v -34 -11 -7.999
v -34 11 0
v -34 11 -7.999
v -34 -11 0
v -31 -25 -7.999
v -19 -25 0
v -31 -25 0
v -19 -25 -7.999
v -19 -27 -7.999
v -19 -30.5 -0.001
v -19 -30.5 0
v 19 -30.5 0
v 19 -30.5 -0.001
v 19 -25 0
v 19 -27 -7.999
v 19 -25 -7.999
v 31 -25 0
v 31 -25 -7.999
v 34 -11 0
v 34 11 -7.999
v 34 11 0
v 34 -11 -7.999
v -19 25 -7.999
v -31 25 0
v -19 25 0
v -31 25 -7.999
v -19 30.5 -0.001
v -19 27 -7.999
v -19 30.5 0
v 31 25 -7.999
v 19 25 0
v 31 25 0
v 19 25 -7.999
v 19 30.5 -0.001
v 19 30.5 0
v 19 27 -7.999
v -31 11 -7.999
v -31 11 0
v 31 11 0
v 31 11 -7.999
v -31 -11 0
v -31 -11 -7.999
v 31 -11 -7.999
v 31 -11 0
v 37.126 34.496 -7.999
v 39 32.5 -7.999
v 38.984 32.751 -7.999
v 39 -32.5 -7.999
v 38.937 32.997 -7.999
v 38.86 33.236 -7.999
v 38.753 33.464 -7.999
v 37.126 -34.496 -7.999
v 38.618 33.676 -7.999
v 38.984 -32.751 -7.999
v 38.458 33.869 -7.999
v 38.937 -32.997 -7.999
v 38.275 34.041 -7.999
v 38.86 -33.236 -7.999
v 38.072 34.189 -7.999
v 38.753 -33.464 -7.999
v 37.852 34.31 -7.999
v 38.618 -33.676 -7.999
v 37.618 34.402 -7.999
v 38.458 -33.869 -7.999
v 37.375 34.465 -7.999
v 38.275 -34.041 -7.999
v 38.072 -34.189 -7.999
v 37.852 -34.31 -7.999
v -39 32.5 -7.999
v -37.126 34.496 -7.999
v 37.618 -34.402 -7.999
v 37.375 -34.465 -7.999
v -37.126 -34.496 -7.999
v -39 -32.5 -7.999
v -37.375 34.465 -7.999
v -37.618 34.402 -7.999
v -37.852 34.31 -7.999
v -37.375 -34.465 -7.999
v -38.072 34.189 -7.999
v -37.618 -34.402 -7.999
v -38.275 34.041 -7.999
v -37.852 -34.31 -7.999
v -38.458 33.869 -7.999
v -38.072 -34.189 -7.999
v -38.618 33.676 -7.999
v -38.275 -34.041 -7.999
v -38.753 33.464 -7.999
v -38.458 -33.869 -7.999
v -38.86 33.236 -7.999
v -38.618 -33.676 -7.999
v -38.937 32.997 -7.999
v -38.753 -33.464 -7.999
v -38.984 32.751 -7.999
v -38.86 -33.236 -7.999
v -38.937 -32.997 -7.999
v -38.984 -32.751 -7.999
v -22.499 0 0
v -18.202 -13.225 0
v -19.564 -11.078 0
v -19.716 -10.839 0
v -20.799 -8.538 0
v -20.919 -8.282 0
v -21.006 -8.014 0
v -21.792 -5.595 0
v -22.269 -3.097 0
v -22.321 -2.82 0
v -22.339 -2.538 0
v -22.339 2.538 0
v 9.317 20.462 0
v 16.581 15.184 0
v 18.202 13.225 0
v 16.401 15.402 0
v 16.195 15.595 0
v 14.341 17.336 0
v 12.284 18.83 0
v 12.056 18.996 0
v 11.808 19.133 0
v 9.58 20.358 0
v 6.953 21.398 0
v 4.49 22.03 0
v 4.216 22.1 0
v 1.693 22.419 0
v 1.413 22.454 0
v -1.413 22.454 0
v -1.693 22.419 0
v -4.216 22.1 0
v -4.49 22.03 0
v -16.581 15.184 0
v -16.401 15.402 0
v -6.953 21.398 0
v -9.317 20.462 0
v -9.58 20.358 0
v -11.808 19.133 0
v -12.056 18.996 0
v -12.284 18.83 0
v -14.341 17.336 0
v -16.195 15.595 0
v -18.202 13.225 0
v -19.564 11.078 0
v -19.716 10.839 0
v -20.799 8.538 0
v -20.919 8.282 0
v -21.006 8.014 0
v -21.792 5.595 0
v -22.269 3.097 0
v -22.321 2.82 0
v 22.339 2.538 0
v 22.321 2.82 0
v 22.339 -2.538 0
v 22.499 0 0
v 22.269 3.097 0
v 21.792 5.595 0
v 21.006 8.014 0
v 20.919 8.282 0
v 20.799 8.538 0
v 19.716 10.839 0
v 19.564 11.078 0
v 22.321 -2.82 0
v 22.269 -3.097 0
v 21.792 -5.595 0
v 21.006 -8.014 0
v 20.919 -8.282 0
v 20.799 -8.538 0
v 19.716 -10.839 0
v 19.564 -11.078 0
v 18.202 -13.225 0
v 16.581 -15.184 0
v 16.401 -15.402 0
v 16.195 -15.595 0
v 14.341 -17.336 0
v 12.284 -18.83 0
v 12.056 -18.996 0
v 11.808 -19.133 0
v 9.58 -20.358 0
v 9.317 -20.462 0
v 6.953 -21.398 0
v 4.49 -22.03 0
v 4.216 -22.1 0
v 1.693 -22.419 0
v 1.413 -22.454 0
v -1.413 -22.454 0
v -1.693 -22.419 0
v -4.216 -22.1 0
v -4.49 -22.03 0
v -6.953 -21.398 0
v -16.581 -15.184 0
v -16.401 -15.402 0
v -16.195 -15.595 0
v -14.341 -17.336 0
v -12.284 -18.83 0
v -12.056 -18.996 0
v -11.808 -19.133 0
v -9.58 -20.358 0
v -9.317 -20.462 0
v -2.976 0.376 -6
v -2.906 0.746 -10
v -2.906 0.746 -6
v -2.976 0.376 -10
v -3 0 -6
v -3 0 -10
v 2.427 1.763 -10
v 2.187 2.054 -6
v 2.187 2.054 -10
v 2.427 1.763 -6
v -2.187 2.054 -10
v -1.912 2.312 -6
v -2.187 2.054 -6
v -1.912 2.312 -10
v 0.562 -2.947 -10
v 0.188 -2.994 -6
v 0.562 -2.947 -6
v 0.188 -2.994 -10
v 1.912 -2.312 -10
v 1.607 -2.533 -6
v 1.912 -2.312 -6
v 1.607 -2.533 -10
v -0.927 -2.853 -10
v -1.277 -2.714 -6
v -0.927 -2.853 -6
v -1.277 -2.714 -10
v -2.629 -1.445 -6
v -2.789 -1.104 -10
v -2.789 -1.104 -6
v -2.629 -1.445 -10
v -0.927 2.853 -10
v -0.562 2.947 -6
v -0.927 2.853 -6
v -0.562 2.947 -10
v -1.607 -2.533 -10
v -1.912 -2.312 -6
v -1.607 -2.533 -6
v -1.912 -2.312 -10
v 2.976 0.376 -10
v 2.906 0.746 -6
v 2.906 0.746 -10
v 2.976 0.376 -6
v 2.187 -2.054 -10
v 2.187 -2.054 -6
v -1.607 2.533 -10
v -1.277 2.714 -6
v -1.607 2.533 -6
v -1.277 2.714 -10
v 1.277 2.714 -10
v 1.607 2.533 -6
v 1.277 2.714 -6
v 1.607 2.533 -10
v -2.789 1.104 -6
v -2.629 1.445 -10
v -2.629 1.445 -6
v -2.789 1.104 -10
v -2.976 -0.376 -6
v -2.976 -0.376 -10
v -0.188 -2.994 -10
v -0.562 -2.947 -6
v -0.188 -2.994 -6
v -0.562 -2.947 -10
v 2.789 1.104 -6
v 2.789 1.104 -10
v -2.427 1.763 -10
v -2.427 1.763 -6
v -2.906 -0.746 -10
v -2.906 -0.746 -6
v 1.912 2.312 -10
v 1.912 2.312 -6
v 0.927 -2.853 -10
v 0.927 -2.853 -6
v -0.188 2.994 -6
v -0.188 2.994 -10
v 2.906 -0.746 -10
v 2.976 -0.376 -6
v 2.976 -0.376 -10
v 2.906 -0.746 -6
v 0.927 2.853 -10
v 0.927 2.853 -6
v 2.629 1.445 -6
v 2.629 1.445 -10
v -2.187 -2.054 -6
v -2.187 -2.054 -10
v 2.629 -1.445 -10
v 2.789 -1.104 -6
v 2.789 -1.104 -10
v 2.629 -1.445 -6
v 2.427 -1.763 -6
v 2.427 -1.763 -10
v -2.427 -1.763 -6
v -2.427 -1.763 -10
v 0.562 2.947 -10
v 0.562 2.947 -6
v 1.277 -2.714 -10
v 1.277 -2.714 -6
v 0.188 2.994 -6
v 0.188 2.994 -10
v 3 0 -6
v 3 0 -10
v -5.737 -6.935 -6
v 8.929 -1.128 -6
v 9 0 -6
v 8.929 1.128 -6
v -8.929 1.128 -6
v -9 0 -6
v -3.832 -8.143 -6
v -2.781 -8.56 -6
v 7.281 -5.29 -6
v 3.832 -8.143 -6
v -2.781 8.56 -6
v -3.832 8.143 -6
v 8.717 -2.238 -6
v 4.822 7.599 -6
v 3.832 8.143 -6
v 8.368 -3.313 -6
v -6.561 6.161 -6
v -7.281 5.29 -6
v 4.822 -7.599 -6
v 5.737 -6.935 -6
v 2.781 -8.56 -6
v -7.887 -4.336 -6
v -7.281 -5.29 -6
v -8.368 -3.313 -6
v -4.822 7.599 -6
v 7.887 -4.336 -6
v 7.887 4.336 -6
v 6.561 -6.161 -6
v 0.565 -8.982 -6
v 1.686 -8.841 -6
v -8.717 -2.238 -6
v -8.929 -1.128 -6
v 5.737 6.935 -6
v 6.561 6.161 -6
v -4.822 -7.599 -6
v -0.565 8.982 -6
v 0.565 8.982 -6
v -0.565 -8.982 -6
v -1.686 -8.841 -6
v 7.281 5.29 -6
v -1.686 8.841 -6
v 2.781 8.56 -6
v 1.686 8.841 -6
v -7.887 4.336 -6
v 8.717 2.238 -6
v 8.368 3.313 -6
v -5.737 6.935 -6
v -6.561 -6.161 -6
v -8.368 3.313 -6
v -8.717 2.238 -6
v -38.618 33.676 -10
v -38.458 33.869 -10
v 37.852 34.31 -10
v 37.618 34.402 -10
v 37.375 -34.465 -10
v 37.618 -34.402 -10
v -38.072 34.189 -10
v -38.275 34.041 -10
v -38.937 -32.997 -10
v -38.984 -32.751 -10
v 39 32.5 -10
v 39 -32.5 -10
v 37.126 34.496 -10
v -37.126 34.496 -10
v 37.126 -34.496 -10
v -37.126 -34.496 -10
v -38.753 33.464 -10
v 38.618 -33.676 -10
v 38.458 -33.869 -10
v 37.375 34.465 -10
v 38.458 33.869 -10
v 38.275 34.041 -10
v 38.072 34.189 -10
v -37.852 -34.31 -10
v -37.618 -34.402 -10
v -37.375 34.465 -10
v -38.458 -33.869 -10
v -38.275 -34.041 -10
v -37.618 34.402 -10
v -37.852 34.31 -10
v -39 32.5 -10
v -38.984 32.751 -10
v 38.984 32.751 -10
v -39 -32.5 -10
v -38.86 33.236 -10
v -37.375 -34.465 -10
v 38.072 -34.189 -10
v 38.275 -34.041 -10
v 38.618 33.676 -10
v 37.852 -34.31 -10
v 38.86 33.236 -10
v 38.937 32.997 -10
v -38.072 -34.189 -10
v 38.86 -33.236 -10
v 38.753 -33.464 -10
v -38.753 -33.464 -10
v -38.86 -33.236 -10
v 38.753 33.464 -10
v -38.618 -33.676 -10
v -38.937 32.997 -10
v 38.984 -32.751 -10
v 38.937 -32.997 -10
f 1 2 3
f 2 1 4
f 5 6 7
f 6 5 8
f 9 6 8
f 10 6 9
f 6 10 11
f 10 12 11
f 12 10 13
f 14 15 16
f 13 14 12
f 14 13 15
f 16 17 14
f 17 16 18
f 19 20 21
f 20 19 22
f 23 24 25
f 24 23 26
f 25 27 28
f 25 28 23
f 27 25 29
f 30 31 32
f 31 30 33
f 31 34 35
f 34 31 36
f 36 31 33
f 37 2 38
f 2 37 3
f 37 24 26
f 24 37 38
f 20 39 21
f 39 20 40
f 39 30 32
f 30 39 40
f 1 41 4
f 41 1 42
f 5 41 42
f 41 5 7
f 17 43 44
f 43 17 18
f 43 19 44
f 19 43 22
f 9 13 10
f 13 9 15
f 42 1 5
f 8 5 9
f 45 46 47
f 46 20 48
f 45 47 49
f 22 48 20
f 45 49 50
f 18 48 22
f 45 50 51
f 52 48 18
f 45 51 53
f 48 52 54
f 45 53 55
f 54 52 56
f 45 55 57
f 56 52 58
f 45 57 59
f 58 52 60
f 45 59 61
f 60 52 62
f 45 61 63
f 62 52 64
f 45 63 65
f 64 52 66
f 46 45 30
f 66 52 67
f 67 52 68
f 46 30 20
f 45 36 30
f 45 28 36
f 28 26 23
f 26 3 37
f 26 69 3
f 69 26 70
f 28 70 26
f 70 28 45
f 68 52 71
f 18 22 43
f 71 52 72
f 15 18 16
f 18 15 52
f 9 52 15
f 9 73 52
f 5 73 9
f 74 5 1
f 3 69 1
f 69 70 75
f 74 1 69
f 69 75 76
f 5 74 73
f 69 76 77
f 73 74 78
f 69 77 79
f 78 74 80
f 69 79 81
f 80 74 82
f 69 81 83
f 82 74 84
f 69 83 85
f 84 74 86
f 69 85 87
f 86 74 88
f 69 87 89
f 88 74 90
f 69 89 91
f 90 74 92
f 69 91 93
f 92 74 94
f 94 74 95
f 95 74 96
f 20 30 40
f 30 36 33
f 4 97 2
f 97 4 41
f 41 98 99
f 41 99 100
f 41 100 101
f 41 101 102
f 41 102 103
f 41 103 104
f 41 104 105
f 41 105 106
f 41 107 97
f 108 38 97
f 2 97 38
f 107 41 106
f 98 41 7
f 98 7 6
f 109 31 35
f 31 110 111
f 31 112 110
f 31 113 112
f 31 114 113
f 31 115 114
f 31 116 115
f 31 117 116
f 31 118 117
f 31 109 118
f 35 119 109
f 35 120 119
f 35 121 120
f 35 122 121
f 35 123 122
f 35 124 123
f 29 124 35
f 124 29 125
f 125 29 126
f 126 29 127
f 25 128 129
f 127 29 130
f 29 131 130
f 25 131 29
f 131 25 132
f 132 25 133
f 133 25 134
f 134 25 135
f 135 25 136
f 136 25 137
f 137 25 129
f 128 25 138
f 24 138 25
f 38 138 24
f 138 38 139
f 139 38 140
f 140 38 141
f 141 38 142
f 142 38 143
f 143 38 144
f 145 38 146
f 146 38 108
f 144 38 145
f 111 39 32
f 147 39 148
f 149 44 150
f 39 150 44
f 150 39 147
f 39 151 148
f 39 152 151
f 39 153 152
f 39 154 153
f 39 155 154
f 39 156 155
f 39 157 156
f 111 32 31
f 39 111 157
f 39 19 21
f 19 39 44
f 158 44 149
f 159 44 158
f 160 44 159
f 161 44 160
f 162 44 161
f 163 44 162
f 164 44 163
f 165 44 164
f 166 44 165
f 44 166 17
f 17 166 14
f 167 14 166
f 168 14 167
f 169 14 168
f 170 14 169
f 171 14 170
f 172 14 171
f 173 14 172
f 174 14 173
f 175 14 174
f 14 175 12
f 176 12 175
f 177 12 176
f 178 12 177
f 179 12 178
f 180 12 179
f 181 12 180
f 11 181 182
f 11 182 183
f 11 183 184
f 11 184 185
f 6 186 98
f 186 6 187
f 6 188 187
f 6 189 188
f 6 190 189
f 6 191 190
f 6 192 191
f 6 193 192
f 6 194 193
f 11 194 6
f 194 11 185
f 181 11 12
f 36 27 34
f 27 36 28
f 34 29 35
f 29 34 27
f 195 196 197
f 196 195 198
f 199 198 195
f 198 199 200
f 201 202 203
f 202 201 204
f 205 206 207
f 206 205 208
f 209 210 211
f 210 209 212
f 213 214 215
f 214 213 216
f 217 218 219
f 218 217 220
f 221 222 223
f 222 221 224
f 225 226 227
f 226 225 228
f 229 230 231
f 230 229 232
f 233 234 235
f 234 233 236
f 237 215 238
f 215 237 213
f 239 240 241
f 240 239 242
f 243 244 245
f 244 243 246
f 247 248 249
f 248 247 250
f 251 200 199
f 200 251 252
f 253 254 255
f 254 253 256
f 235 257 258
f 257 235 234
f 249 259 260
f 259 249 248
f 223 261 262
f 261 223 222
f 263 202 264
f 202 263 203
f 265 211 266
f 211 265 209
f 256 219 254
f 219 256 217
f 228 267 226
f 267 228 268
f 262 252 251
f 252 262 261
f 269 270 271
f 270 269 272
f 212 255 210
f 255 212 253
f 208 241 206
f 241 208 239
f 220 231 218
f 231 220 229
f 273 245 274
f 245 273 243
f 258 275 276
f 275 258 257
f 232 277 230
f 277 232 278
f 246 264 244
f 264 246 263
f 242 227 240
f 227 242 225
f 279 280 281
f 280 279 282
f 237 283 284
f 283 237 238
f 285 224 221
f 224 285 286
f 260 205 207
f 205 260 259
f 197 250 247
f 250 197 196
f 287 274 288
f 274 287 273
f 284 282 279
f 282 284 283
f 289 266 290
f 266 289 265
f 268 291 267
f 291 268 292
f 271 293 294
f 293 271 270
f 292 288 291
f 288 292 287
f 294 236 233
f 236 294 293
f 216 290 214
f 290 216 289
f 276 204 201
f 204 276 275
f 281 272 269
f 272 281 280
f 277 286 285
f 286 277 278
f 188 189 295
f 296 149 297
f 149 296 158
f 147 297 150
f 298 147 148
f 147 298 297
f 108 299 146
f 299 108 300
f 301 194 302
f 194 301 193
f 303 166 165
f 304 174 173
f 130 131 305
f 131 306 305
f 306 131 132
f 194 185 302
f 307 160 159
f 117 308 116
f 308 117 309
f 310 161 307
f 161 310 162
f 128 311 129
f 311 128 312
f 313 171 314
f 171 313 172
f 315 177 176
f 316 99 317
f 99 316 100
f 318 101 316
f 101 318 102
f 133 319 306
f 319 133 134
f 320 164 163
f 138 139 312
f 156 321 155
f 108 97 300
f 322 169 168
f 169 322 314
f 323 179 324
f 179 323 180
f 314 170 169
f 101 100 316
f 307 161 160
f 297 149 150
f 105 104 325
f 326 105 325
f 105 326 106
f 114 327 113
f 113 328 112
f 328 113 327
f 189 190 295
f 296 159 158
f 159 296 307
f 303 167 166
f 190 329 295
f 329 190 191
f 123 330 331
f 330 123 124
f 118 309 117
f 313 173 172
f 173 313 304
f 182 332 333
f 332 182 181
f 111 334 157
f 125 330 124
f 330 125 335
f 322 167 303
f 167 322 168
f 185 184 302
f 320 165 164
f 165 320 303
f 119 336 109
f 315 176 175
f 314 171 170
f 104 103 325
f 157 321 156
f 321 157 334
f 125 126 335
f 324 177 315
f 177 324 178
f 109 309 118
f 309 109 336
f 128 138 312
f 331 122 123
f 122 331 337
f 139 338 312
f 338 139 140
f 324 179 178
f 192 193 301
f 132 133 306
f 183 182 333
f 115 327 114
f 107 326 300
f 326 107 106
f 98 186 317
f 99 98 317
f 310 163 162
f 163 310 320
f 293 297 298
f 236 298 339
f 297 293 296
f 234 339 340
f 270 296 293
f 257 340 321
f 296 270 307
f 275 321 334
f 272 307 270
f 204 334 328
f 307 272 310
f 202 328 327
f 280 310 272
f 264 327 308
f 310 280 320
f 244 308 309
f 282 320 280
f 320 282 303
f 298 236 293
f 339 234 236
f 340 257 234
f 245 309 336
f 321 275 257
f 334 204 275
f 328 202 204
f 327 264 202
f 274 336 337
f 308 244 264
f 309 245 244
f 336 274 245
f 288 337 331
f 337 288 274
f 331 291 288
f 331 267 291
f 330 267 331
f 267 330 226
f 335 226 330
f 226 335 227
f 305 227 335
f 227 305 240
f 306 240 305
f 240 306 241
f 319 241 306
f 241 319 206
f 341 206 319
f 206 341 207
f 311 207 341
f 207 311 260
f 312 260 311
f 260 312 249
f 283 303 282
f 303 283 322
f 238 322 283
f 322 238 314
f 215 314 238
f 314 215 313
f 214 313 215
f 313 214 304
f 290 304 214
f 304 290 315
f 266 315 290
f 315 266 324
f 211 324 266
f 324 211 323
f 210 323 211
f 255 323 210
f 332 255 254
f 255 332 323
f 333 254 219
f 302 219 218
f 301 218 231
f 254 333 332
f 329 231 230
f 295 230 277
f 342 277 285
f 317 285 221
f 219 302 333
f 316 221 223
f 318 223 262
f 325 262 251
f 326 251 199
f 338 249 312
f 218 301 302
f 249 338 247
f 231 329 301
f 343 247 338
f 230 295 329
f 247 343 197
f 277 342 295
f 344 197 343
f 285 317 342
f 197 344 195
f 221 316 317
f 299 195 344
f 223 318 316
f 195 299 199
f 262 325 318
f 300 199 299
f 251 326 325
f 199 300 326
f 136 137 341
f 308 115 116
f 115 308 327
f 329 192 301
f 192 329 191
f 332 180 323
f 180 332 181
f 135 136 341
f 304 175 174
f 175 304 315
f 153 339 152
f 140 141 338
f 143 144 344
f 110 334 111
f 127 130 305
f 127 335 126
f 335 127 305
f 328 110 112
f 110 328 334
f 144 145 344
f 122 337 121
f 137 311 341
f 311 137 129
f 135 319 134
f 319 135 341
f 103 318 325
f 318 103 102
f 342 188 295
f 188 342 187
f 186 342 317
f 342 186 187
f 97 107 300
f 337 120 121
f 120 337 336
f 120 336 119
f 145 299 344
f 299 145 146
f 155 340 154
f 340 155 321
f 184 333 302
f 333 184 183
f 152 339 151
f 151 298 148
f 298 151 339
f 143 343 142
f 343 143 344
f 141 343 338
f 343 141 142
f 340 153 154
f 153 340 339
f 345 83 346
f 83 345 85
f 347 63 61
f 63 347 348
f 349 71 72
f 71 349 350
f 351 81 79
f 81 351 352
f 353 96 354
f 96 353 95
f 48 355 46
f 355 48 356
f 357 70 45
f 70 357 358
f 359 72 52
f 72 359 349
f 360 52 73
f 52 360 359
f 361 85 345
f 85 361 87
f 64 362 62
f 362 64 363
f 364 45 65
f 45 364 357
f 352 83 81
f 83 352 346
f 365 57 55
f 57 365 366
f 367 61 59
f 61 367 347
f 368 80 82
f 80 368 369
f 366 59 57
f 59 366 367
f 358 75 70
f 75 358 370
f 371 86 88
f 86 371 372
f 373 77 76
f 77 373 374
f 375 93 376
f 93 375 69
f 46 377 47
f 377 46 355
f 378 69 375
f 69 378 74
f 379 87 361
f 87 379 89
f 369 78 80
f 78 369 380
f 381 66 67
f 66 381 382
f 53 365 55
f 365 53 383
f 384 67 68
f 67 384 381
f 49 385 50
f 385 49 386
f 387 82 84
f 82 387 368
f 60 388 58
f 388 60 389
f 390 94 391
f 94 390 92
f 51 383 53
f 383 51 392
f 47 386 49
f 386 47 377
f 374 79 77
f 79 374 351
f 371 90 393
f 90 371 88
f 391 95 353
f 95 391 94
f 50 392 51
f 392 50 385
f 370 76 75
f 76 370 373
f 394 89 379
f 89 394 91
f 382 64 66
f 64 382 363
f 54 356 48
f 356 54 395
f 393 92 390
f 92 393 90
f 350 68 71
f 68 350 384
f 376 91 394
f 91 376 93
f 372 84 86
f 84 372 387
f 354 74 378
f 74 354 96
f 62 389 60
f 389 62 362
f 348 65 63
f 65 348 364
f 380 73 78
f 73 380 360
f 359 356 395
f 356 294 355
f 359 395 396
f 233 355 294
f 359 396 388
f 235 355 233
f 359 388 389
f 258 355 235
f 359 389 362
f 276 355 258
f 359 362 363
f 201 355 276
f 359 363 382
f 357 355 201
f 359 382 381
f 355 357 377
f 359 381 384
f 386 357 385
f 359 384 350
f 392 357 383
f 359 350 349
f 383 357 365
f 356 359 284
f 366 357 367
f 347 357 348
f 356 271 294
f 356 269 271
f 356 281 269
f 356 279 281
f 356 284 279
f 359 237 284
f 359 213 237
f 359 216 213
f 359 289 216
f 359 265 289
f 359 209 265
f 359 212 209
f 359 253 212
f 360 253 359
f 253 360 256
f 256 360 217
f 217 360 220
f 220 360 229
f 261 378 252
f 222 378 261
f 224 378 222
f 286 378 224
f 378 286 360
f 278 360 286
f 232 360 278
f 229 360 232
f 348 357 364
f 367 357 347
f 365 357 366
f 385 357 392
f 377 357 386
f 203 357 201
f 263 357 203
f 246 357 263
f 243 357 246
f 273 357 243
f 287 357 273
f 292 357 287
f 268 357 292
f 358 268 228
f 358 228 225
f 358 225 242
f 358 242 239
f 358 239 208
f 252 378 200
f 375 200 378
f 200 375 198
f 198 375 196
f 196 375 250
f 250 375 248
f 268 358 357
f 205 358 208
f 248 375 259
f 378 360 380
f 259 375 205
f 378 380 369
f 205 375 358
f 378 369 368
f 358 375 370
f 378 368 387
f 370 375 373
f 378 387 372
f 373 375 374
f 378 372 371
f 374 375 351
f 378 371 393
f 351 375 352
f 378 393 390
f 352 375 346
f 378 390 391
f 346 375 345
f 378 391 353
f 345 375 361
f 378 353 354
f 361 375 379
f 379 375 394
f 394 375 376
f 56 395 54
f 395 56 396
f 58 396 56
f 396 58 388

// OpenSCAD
//How wide the clip part is flat side to flat side
ShoeBottomWidth = 68;
// The widest part of the angle
ShoeBottomLength = 61; 
//How wide the clip part is flat side to flat side
ShoeTopWidth = 68;
// The narrowest part of the angle
ShoeTopLength = 54; 
// How tall the shoe part is
ShoeDepth = 8;

// How long any 'keying' is on the front/back face of the shoe
FrontDetentLength = 15;
// How wide any 'keying' is on the front/back face of the shoe
FrontDetentWidth = 2;

// How long any 'keying' is on the side of the shoe
SideDetentLength = 16;
// How wide any 'keying' is on the side of the shoe
SideDetentWidth = 3;

TopPlateWidth = 78;
TopPlateLength = 69;
TopPlateDepth = 2;

$fn=50 + 0;

rotate(a=[0,180,0])
{
	difference()
	{
		shoe();
		shoekeys();
		cylinder(h = ShoeDepth, r=3);
		rotate(a=[0,180,0]) translate([0,0,2-ShoeDepth]) cylinder(h = ShoeDepth, r1 = 9, r2 = min(ShoeBottomWidth, ShoeBottomLength, ShoeTopWidth, ShoeTopLength) * .5);
	
	}
	
	// Face Plate
	difference()
	{
		minkowski()
		{
			translate([0,0, ShoeDepth]) cube(size = [TopPlateWidth - TopPlateDepth- TopPlateDepth,TopPlateLength - TopPlateDepth - TopPlateDepth,.001], center = true);
		 	cylinder(r=TopPlateDepth,h=TopPlateDepth);
		}
		translate([0,0, TopPlateDepth * 2]) cylinder(h = ShoeDepth, r=3);
	}
}



module shoe() {
	hull() {
		translate([0,0, .001]) cube(size = [ShoeBottomWidth,ShoeBottomLength,.001], center = true);
 		translate([0,0,ShoeDepth-.001]) cube(size = [ShoeTopWidth,ShoeTopLength,.001], center = true);
	}
}

module shoekeys()
{

	//Front and back keys
	hull()
	{	
		translate([(ShoeTopWidth * .5) - FrontDetentLength, (ShoeTopLength * .5) - ShoeTopLength, 0]) cube(size = [FrontDetentLength,FrontDetentWidth,ShoeDepth], center = false);
		translate([(ShoeBottomWidth * .5) - FrontDetentLength, -(ShoeBottomLength * .5) , 0]) cube(size = [FrontDetentLength,FrontDetentWidth,ShoeDepth], center = false);
	}
	hull()
	{	
		translate([-(ShoeTopWidth * .5) , (ShoeTopLength * .5) - ShoeTopLength, 0]) cube(size = [FrontDetentLength,FrontDetentWidth,ShoeDepth], center = false);
		translate([-(ShoeBottomWidth * .5) , -(ShoeBottomLength * .5) , 0]) cube(size = [FrontDetentLength,FrontDetentWidth,ShoeDepth], center = false);
	}

	hull()
	{	
		translate([(ShoeTopWidth * .5) - FrontDetentLength, (ShoeTopLength * .5) -FrontDetentWidth, 0]) cube(size = [FrontDetentLength,FrontDetentWidth,ShoeDepth], center = false);
		translate([(ShoeBottomWidth * .5) - FrontDetentLength, (ShoeBottomLength * .5) , 0]) cube(size = [FrontDetentLength,FrontDetentWidth,ShoeDepth], center = false);
	}
	hull()
	{	
		translate([-(ShoeTopWidth * .5) , (ShoeTopLength * .5) -FrontDetentWidth, 0]) cube(size = [FrontDetentLength,FrontDetentWidth,ShoeDepth], center = false);
		translate([-(ShoeBottomWidth * .5) , (ShoeBottomLength * .5) , 0]) cube(size = [FrontDetentLength,FrontDetentWidth,ShoeDepth], center = false);
	}

	// Side Keys
	hull()
	{
		translate([(ShoeTopWidth * .5) - SideDetentWidth , (ShoeTopLength * .5) - SideDetentLength, 0]) cube(size = [SideDetentWidth,SideDetentLength,ShoeDepth], center = false);
		translate([(ShoeBottomWidth * .5) - SideDetentWidth , (ShoeBottomLength * .5) - SideDetentLength, 0]) cube(size = [SideDetentWidth,SideDetentLength,ShoeDepth], center = false);
	}
	hull()
	{
	translate([-(ShoeTopWidth * .5)  , (ShoeTopLength * .5) - SideDetentLength, 0]) cube(size = [SideDetentWidth,SideDetentLength,ShoeDepth], center = false);
		translate([-(ShoeBottomWidth * .5)  , (ShoeBottomLength * .5) - SideDetentLength, 0]) cube(size = [SideDetentWidth,SideDetentLength,ShoeDepth], center = false);
	}
	hull()
	{
		translate([(ShoeTopWidth * .5) - SideDetentWidth , -(ShoeTopLength * .5), 0]) cube(size = [SideDetentWidth,SideDetentLength,ShoeDepth], center = false);
		translate([(ShoeBottomWidth * .5) - SideDetentWidth , -(ShoeBottomLength * .5), 0]) cube(size = [SideDetentWidth,SideDetentLength,ShoeDepth], center = false);
	}
	hull()
	{
	translate([-(ShoeTopWidth * .5)  , -(ShoeTopLength * .5) , 0]) cube(size = [SideDetentWidth,SideDetentLength,ShoeDepth], center = false);
		translate([-(ShoeBottomWidth * .5)  , -(ShoeBottomLength * .5) , 0]) cube(size = [SideDetentWidth,SideDetentLength,ShoeDepth], center = false);
	}
}
